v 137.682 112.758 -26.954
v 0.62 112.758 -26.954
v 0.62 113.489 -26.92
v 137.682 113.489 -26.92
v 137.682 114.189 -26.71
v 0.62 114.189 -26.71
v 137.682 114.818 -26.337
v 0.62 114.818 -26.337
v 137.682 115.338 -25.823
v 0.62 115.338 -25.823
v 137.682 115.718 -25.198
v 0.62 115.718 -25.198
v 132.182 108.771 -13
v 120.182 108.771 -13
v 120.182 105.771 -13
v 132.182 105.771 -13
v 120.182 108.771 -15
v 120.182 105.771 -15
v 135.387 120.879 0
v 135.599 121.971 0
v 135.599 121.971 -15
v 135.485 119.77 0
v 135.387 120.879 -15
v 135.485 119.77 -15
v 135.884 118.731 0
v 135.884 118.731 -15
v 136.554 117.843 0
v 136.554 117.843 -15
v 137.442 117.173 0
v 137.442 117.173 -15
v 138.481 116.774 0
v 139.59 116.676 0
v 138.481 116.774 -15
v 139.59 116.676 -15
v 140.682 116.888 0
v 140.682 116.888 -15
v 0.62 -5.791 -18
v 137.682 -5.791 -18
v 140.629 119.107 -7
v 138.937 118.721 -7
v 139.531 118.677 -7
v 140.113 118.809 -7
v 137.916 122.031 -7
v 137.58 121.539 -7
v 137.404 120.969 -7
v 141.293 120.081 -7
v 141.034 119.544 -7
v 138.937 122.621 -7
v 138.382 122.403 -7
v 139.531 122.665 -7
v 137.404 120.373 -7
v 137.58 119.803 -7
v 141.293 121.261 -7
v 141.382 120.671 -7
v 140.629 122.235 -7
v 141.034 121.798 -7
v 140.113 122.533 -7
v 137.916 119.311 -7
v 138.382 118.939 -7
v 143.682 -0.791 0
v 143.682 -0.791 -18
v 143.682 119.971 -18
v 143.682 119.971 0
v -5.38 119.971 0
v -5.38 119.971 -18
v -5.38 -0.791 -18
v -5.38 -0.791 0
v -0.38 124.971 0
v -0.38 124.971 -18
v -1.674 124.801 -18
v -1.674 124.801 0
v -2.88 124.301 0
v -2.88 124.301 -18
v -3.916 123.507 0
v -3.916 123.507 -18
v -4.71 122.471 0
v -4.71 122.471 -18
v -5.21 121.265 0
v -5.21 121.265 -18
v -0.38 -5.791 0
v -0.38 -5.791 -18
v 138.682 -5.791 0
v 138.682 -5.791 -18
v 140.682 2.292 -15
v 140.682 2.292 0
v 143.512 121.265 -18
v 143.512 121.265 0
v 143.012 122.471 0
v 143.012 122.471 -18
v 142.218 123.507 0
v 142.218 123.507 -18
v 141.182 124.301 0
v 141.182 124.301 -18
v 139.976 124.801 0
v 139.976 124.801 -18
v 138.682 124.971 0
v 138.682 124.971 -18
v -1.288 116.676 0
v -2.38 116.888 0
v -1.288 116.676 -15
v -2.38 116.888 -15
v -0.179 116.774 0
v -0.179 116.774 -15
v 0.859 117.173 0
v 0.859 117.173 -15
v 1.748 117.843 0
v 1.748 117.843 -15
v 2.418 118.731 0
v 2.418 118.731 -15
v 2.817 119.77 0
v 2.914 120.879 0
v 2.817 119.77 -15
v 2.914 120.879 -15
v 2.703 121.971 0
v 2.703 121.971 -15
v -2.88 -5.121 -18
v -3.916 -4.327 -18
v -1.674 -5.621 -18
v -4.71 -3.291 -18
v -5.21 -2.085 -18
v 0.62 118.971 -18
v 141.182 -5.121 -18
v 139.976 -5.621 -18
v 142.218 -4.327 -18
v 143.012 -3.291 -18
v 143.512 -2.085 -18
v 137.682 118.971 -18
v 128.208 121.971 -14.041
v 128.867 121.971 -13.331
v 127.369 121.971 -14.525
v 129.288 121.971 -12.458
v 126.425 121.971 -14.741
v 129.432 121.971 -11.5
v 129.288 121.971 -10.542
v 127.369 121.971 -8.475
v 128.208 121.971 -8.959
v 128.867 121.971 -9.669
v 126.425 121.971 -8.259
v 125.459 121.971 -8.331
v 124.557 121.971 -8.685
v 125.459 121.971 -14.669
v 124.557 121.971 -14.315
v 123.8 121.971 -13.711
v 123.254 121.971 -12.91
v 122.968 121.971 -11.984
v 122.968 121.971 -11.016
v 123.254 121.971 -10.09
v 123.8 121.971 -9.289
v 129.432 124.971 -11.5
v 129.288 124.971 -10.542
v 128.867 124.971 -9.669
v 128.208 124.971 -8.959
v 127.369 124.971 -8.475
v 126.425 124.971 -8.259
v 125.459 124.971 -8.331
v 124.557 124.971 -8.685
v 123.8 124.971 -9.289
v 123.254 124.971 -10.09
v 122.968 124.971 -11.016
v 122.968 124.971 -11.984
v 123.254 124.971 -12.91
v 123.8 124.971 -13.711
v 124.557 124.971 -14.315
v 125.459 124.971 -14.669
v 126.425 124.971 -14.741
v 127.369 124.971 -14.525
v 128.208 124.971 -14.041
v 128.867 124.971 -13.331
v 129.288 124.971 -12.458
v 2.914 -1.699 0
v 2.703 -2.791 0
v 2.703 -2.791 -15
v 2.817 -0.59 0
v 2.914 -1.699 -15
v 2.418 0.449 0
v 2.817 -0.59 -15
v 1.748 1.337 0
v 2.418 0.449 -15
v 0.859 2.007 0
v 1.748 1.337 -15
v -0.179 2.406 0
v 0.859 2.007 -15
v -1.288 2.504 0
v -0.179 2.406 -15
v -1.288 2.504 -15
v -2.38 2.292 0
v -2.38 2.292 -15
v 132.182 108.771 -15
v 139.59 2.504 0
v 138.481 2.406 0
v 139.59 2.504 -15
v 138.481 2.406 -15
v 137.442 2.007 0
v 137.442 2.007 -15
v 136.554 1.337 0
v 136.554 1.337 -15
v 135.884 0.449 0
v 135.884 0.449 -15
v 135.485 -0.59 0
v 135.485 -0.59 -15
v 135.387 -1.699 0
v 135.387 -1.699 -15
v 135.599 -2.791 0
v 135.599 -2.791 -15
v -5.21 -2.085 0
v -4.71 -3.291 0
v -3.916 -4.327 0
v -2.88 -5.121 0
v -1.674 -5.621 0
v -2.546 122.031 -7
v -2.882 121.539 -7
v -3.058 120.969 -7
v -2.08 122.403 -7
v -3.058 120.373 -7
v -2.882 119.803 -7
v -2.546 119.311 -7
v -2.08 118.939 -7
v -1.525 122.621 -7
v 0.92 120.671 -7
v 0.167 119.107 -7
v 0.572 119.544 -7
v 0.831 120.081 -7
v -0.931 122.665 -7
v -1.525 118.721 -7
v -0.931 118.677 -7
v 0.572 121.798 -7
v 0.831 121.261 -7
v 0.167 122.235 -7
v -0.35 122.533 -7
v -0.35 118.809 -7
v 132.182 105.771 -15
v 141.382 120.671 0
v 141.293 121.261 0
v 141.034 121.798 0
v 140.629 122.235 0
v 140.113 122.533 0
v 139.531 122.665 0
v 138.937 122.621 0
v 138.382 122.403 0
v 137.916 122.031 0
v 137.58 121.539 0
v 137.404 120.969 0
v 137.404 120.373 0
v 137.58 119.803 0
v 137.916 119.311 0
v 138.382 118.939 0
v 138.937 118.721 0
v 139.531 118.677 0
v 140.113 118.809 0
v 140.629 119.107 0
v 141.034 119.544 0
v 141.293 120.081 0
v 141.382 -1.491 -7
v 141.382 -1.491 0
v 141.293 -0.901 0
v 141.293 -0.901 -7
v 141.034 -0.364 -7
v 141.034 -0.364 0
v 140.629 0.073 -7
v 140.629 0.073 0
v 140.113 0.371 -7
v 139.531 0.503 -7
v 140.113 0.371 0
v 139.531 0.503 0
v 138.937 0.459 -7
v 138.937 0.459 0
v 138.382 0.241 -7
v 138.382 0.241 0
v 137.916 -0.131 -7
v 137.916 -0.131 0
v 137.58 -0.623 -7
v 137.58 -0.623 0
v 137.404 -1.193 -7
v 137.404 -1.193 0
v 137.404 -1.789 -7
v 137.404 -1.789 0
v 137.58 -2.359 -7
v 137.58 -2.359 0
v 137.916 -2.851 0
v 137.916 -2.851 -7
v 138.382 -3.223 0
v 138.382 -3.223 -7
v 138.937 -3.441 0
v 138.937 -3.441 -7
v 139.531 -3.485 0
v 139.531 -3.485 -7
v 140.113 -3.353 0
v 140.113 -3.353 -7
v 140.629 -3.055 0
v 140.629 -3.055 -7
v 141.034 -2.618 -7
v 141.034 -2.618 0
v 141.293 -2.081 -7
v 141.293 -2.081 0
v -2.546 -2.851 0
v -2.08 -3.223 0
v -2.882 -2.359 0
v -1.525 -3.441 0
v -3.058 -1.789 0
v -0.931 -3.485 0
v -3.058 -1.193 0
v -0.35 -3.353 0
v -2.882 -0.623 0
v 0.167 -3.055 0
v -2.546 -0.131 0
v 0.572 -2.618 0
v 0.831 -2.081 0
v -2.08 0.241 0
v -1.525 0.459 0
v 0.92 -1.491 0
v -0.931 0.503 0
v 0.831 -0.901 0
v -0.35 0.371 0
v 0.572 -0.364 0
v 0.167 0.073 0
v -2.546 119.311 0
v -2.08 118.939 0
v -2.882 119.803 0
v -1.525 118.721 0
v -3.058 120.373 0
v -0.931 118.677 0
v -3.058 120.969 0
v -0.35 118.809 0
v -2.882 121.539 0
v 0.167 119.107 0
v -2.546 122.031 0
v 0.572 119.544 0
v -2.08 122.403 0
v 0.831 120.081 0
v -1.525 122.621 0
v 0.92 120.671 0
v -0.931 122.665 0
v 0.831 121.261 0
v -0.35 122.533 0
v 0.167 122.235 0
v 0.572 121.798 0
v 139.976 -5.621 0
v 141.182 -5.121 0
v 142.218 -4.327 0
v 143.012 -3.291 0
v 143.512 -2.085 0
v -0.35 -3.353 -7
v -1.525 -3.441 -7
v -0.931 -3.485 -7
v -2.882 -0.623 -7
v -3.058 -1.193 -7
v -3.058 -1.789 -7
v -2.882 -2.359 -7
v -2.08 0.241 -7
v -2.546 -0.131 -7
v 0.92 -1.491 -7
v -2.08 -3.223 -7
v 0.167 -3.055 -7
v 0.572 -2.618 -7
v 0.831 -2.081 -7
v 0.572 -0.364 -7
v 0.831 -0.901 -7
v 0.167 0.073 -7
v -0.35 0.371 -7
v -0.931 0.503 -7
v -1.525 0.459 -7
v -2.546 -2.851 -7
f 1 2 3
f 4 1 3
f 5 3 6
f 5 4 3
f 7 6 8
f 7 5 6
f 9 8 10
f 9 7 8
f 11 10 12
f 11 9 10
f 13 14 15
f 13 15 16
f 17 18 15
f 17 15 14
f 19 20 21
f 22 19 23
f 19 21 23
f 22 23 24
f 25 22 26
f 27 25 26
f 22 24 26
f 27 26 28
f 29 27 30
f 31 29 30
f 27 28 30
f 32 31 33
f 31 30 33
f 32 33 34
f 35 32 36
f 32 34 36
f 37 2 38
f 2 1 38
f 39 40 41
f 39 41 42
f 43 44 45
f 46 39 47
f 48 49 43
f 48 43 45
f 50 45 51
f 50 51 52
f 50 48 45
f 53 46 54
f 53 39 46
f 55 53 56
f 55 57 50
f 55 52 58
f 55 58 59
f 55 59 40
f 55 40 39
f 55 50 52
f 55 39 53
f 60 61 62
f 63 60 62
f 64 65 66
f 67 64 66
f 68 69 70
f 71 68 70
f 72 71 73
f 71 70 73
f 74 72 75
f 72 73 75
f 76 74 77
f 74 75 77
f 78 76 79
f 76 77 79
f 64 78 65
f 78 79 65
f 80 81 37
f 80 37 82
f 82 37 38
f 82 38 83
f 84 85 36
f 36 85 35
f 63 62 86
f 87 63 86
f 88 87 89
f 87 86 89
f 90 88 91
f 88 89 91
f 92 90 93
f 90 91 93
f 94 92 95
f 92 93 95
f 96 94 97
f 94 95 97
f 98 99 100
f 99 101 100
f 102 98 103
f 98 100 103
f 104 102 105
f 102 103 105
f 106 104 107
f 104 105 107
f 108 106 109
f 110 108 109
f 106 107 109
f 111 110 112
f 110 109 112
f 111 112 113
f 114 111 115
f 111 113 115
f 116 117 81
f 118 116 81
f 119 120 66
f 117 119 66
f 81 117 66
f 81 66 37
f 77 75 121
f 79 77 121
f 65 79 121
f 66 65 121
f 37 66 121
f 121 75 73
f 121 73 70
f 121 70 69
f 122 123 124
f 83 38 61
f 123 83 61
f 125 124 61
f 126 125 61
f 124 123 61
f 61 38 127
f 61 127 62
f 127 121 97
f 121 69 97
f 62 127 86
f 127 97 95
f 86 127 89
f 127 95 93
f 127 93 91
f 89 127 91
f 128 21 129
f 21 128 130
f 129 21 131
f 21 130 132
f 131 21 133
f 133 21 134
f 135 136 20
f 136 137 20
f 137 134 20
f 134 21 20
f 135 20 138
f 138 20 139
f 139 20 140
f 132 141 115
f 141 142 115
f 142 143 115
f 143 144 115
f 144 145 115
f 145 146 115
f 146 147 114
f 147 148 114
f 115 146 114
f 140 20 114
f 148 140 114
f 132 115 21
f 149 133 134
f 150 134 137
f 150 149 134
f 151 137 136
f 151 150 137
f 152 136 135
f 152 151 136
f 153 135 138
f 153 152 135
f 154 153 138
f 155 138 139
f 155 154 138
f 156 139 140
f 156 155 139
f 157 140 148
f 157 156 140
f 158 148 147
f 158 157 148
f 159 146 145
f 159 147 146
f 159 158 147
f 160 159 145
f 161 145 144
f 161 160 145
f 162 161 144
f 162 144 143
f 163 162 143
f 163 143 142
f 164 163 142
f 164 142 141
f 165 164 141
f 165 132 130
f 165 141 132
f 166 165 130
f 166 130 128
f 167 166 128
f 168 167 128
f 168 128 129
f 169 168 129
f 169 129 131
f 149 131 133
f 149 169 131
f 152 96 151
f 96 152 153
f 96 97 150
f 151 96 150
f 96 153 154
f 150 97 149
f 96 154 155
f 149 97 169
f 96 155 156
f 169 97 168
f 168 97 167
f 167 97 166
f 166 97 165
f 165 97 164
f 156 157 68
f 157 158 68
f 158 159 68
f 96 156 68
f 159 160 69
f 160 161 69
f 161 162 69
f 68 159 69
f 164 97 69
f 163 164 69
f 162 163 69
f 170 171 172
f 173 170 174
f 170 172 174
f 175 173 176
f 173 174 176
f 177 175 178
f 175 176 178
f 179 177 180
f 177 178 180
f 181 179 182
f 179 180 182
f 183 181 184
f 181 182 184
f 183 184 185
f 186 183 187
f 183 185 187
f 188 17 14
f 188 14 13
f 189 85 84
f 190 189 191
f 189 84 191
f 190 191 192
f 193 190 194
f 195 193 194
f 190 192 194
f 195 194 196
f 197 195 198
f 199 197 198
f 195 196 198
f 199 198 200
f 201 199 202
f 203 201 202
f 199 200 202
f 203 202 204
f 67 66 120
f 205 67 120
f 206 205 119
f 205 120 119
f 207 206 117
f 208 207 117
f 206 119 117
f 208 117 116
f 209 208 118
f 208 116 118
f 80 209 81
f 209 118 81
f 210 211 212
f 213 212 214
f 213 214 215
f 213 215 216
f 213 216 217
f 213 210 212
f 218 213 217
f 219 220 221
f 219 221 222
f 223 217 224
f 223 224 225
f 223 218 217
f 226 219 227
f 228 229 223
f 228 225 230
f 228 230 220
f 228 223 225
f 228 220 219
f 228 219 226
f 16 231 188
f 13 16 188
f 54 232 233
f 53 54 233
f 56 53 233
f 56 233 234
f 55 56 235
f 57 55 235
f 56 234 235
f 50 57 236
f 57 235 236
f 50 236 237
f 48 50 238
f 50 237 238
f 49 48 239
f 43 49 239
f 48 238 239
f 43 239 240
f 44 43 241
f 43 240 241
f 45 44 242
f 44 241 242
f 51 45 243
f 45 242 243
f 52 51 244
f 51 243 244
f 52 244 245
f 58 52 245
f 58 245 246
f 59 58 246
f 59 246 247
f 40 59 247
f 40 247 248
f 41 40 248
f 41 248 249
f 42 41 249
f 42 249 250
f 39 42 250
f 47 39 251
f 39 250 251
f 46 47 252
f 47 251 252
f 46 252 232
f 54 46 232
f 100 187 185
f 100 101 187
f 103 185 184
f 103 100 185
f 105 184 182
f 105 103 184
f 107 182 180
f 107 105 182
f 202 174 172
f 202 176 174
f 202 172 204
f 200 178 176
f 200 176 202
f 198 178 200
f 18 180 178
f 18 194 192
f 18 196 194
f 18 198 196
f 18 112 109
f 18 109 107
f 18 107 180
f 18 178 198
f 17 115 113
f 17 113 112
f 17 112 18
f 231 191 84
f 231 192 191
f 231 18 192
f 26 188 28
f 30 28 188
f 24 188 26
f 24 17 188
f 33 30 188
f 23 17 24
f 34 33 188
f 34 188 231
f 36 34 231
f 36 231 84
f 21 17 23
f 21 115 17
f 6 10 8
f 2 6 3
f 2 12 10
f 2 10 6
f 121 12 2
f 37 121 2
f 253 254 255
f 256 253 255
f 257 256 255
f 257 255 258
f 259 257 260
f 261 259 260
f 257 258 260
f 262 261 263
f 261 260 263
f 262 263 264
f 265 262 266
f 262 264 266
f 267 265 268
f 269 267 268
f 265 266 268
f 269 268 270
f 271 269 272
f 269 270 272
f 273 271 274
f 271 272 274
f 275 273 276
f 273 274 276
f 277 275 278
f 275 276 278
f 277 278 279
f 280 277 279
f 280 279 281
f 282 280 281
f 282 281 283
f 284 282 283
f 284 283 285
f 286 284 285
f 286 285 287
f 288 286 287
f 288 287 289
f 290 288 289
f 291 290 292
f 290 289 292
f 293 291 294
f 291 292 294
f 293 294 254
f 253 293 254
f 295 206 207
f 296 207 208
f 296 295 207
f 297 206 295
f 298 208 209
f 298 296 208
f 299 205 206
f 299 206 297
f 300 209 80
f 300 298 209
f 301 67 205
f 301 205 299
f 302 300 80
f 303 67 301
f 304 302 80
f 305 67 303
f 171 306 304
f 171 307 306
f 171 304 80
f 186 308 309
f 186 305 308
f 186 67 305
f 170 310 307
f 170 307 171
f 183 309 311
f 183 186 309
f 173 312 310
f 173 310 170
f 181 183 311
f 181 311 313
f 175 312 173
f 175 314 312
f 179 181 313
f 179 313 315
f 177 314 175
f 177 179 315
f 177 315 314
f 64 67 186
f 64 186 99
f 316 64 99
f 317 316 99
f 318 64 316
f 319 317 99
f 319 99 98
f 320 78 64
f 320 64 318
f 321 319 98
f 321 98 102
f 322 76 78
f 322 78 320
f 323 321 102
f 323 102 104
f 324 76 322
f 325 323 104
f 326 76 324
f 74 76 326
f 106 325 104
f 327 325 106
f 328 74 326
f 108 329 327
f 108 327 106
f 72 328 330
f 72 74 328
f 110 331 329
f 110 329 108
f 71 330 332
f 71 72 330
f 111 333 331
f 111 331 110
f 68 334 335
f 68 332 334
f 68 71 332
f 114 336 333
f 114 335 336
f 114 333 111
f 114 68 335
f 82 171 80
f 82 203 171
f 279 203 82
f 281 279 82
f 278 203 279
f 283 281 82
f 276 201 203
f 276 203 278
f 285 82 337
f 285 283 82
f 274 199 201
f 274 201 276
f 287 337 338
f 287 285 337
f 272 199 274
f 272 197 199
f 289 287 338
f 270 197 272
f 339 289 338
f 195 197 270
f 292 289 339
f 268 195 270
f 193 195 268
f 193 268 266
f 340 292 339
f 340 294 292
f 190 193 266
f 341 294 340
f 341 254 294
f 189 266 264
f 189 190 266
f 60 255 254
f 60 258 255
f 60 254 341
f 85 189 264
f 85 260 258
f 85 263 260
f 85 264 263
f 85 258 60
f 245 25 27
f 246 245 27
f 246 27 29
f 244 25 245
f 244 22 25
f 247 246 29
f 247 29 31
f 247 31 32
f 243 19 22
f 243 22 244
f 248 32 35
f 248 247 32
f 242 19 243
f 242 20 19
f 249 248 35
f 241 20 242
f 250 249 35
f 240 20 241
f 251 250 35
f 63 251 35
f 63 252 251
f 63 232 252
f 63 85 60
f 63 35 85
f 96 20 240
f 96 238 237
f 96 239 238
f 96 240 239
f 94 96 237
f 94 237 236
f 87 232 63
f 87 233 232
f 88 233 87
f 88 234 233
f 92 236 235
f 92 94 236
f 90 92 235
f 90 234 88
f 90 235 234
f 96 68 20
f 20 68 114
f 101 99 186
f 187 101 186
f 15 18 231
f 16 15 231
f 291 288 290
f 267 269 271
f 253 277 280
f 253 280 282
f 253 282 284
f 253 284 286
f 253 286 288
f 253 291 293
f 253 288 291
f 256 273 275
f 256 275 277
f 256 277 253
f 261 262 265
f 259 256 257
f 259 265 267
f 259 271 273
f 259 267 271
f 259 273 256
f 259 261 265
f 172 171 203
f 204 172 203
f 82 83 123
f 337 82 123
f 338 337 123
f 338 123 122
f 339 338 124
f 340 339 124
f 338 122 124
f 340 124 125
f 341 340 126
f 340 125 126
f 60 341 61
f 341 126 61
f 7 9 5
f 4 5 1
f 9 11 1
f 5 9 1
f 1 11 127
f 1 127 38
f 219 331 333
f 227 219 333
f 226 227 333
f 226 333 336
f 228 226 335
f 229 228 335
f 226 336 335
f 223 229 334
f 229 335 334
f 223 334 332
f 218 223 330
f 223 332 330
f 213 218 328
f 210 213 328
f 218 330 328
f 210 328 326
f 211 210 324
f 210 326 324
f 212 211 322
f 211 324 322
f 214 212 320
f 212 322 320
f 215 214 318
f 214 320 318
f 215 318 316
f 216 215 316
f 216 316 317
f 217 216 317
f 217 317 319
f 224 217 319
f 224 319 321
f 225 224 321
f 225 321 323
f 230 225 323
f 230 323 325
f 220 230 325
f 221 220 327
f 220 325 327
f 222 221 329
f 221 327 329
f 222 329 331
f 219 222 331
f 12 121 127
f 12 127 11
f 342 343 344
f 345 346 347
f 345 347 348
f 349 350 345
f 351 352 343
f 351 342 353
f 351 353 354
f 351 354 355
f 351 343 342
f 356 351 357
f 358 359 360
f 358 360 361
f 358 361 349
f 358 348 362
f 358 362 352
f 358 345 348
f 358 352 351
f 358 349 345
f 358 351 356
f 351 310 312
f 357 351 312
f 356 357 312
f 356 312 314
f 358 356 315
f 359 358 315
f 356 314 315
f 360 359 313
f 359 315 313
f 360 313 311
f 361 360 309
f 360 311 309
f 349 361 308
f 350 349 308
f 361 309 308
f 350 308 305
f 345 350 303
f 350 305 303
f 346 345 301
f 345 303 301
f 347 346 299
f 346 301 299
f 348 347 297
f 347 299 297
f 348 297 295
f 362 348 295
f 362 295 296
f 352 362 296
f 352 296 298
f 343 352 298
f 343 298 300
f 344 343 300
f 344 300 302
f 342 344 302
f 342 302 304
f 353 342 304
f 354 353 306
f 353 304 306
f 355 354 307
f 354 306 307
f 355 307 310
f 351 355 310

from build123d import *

# Parameters (mm, degrees)
LEFT_BODY_PAD_DEPTH            = 18
LEFT_BODY_CAVITY_POCKET_DEPTH  = 15
LEFT_BODY_BOSSES_R             = 4
LEFT_BODY_BOSS_PAD_DEPTH       = 15
LEFT_BODY_INSERT_HOLES_R       = 2
LEFT_BODY_INSERT_POCKETS_DEPTH = 7
LEFT_BODY_REST_PAD_DEPTH       = 68.531175
LEFT_BODY_REST_FILLET_R        = 3
LEFT_JACK_HOLE_R               = 3.25
LEFT_JACK_HOLE_POCKET_DEPTH    = 3.2
LEFT_JACK_STOP_W               = 12
LEFT_JACK_STOP_H               = 3
LEFT_JACK_STOP_PAD_DEPTH       = 2


with BuildPart() as part:
    # Left_Body_Outline → Left_Body_Pad (new body)
    with BuildSketch(Plane.XY.offset(-18)):
        with BuildLine():
            Line((-0.38035, -5.791), (138.682, -5.791))
            ThreePointArc((138.682, -5.791), (142.217534, -4.326534), (143.682, -0.791))
            Line((143.682, -0.791), (143.682, 119.971))
            ThreePointArc((143.682, 119.971), (142.217534, 123.506534), (138.682, 124.971))
            Line((138.682, 124.971), (-0.38035, 124.971))
            ThreePointArc((-0.38035, 124.971), (-3.915884, 123.506534), (-5.38035, 119.971))
            Line((-5.38035, 119.971), (-5.38035, -0.791))
            ThreePointArc((-5.38035, -0.791), (-3.915884, -4.326534), (-0.38035, -5.791))
        make_face()
    extrude(amount=LEFT_BODY_PAD_DEPTH)

    # Left_Body_Cavity → Left_Body_Cavity_Pocket (cut)
    with BuildSketch(Plane.XY):
        with BuildLine():
            Line((-0.38035, -2.791), (138.682, -2.791))
            ThreePointArc((138.682, -2.791), (140.096214, -2.205214), (140.682, -0.791))
            Line((140.682, -0.791), (140.682, 119.971))
            ThreePointArc((140.682, 119.971), (140.096214, 121.385214), (138.682, 121.971))
            Line((138.682, 121.971), (-0.38035, 121.971))
            ThreePointArc((-0.38035, 121.971), (-1.794564, 121.385214), (-2.38035, 119.971))
            Line((-2.38035, 119.971), (-2.38035, -0.791))
            ThreePointArc((-2.38035, -0.791), (-1.794564, -2.205214), (-0.38035, -2.791))
        make_face()
    extrude(amount=-LEFT_BODY_CAVITY_POCKET_DEPTH, mode=Mode.SUBTRACT)

    # Left_Body_Bosses → Left_Body_Boss_Pad (join)
    with BuildSketch(Plane.XY.offset(-15)):
        with Locations((-1.08035, -1.491)):
            Circle(LEFT_BODY_BOSSES_R)
        with Locations((139.382, -1.491)):
            Circle(LEFT_BODY_BOSSES_R)
        with Locations((-1.08035, 120.671)):
            Circle(LEFT_BODY_BOSSES_R)
        with Locations((139.382, 120.671)):
            Circle(LEFT_BODY_BOSSES_R)
    extrude(amount=LEFT_BODY_BOSS_PAD_DEPTH)

    # Left_Body_Insert_Holes → Left_Body_Insert_Pockets (cut)
    with BuildSketch(Plane.XY):
        with Locations((-1.08035, -1.491)):
            Circle(LEFT_BODY_INSERT_HOLES_R)
        with Locations((139.382, -1.491)):
            Circle(LEFT_BODY_INSERT_HOLES_R)
        with Locations((-1.08035, 120.671)):
            Circle(LEFT_BODY_INSERT_HOLES_R)
        with Locations((139.382, 120.671)):
            Circle(LEFT_BODY_INSERT_HOLES_R)
    extrude(amount=-LEFT_BODY_INSERT_POCKETS_DEPTH, mode=Mode.SUBTRACT)

    # Left_Body_Rest → Left_Body_Rest_Pad (join, symmetric)
    with BuildSketch(Plane.YZ.offset(69.150825)):
        Polygon((-5.791, -18), (118.971, -18), (114.852748, -27.112629), align=None)
    extrude(amount=LEFT_BODY_REST_PAD_DEPTH, both=True)

    # Left_Body_Rest_Fillet
    left_body_rest_fillet_edges = [part.edges().sort_by_distance(p)[0] for p in [
        (69.150825, 114.852748, -27.112629),
    ]]
    fillet(left_body_rest_fillet_edges, radius=LEFT_BODY_REST_FILLET_R)

    # Left_Jack_Hole → Left_Jack_Hole_Pocket (cut)
    with BuildSketch(Plane.XZ.offset(-124.971)):
        with Locations((126.182, -11.5)):
            Circle(LEFT_JACK_HOLE_R)
    extrude(amount=LEFT_JACK_HOLE_POCKET_DEPTH, mode=Mode.SUBTRACT)

    # Left_Jack_Stop → Left_Jack_Stop_Pad (join)
    with BuildSketch(Plane.XY.offset(-15)):
        with Locations((126.182, 107.271)):
            Rectangle(LEFT_JACK_STOP_W, LEFT_JACK_STOP_H)
    extrude(amount=LEFT_JACK_STOP_PAD_DEPTH)


solid = part.part
